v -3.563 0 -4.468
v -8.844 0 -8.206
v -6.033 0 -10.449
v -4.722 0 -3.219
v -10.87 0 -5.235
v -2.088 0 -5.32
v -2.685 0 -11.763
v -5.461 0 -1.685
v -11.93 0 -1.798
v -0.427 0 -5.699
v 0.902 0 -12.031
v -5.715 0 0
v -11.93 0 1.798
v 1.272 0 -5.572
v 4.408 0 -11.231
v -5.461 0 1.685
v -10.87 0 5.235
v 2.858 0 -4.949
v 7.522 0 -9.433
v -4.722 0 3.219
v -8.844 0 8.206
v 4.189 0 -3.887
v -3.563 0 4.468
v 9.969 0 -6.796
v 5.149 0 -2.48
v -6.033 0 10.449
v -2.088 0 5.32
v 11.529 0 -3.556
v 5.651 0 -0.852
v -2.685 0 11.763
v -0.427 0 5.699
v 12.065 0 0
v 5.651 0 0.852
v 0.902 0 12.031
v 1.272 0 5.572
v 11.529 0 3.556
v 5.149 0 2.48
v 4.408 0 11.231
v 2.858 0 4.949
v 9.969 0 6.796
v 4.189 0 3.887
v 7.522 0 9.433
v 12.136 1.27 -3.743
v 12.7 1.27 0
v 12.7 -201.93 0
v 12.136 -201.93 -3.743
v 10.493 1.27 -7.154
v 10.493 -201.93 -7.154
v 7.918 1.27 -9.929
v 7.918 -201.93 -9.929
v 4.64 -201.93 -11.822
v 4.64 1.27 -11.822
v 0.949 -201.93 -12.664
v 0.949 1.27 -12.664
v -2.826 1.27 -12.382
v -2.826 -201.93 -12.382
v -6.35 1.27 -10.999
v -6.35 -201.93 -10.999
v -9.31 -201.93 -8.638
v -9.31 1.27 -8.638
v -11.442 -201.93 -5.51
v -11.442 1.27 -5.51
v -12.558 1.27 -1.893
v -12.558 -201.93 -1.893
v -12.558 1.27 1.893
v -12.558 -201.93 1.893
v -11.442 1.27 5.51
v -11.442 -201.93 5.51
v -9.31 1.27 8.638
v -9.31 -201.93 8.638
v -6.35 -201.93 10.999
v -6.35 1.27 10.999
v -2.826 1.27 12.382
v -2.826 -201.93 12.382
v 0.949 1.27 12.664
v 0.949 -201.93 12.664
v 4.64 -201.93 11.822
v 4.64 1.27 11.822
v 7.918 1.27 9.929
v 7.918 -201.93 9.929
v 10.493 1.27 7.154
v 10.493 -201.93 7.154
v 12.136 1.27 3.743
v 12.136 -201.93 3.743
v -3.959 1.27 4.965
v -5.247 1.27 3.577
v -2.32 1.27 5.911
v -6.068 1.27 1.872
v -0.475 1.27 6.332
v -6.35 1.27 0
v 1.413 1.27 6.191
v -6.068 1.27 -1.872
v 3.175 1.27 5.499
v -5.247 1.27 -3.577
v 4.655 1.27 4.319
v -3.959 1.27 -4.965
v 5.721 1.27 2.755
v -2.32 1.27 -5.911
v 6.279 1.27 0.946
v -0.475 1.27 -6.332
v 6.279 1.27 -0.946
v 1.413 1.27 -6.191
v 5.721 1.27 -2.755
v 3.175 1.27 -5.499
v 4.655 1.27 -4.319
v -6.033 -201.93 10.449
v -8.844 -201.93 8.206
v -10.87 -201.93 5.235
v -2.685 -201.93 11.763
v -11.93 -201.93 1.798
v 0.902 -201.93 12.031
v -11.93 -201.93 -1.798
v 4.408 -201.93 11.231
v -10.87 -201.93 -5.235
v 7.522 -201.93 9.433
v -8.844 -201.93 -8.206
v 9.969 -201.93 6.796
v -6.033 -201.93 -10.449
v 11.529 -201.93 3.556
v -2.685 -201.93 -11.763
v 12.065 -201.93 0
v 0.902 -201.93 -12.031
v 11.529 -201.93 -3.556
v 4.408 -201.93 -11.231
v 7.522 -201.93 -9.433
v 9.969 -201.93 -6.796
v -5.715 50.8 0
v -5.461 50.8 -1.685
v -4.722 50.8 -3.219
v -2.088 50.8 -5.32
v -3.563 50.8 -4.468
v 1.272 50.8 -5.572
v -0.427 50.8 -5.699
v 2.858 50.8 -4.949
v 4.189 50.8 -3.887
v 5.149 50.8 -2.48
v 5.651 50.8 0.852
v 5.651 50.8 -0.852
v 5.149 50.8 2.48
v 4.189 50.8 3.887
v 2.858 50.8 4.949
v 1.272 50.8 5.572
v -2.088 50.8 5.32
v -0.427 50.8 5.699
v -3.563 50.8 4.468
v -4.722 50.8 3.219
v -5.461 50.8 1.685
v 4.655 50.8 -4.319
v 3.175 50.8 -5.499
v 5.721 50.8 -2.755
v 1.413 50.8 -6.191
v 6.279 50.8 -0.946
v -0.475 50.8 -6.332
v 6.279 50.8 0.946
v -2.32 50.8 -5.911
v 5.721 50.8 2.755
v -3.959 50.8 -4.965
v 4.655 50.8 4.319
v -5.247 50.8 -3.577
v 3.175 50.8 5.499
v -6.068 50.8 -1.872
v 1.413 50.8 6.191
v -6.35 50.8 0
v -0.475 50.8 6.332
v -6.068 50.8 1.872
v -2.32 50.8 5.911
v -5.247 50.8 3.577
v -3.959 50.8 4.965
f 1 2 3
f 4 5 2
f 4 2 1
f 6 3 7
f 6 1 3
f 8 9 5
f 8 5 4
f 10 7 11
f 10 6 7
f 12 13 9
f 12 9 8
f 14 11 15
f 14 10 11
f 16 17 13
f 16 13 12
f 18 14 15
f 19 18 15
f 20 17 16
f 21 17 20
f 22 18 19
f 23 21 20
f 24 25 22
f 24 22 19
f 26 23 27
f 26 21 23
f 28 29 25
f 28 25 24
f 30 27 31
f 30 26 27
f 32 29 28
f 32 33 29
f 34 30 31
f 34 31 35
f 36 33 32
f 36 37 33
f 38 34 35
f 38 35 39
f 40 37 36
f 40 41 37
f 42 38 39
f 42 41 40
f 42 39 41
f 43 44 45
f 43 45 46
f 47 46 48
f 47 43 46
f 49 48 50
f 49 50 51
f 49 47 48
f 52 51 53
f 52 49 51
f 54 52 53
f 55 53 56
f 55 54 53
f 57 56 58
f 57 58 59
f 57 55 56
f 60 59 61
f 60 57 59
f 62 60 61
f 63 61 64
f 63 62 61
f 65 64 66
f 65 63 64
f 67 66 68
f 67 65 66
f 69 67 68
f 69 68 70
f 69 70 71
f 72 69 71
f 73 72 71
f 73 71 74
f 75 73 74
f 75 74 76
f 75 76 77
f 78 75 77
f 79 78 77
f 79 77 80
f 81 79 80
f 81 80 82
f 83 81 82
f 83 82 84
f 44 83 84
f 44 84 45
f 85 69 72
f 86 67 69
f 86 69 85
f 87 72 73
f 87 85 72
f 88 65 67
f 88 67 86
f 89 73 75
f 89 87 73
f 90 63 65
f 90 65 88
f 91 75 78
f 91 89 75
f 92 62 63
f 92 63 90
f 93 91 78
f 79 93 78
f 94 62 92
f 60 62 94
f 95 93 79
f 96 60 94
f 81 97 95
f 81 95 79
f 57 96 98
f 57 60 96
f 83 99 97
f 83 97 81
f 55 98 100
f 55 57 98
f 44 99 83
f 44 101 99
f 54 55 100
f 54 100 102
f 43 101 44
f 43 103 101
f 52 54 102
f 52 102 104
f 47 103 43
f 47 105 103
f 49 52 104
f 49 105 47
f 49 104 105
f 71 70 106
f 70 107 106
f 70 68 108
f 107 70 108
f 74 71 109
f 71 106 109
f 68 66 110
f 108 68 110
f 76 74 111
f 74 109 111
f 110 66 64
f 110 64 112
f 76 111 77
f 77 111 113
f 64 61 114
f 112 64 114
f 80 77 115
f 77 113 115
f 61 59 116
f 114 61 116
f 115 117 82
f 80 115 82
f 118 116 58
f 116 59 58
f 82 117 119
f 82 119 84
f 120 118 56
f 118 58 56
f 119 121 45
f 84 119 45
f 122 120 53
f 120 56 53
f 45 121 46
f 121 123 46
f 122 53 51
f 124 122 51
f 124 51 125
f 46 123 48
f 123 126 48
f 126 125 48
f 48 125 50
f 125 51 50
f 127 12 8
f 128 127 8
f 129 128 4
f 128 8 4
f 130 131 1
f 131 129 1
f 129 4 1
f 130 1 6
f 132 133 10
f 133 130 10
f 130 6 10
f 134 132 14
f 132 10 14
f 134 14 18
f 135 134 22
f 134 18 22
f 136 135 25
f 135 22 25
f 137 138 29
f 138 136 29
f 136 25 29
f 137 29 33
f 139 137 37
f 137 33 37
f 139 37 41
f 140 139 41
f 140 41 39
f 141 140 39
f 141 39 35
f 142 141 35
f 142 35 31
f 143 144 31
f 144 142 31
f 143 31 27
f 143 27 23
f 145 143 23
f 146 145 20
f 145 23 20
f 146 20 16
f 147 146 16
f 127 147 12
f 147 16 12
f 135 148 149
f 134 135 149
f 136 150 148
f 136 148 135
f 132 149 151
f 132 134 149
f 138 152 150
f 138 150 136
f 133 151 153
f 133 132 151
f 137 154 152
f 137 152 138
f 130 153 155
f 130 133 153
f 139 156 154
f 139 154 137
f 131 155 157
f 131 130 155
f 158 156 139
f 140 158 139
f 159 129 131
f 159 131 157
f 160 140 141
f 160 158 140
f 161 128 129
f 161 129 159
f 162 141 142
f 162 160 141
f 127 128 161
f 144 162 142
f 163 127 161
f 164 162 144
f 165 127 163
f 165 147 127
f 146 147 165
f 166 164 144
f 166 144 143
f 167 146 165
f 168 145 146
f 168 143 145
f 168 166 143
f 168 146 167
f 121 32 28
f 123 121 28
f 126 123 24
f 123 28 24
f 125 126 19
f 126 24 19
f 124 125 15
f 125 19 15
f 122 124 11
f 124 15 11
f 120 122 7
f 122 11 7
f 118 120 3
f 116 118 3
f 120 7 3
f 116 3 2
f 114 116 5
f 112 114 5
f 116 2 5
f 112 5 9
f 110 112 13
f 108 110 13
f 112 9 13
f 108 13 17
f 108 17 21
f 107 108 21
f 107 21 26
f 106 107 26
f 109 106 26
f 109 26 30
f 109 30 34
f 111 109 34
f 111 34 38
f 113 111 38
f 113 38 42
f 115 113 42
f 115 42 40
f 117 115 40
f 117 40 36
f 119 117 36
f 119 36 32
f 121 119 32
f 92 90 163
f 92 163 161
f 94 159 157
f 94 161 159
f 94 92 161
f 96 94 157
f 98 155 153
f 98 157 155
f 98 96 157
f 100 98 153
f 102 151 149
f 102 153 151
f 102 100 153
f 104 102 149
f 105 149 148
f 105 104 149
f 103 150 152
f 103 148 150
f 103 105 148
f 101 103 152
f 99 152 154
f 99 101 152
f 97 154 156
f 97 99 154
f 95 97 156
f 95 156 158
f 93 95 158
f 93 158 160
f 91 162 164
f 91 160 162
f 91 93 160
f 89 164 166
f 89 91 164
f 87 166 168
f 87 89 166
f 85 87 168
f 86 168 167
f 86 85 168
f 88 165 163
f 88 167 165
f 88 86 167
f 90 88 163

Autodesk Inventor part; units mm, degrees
ref_plane "YZ Plane" through (0, 0, 0) normal (1, 0, 0) x (0, 1, 0)
ref_plane "XZ Plane" through (0, 0, 0) normal (0, 1, 0) x (-1, 0, 0)
ref_plane "XY Plane" through (0, 0, 0) normal (0, 0, 1) x (1, 0, 0)
sketch "Sketch1" plane through (0, 0, 0) normal (0, 1, 0) x (-1, 0, 0)
  circle A0 centre (0, 0) radius 6.35
  circle A1 centre (0, 0) radius 5.715
  dimension "d0" = 12.7
  dimension "d1" = 0.635
extrude "Extrusion1" add sketch "Sketch1" along normal blind 50.8
sketch "Sketch2" plane through (0, 0, 0) normal (0, -1, 0) x (1, 0, 0)
  circle A0 centre (0, 0) radius 6.35
  circle A1 centre (0, 0) radius 6.35 projected
  circle A2 centre (0, 0) radius 12.065
  dimension "d4" = 24.13
extrude "Extrusion2" add sketch "Sketch2" against normal blind 1.27
sketch "Sketch3" plane through (0, 1.27, 0) normal (0, 1, 0) x (1, 0, 0)
  circle A0 centre (0, 0) radius 12.065
  circle A1 centre (0, 0) radius 12.065 projected
  circle A2 centre (0, 0) radius 12.7
  dimension "d7" = 25.4
extrude "Extrusion3" add sketch "Sketch3" against normal blind 203.2
properties part number "still pipe small.iam" material "Stainless Steel"
